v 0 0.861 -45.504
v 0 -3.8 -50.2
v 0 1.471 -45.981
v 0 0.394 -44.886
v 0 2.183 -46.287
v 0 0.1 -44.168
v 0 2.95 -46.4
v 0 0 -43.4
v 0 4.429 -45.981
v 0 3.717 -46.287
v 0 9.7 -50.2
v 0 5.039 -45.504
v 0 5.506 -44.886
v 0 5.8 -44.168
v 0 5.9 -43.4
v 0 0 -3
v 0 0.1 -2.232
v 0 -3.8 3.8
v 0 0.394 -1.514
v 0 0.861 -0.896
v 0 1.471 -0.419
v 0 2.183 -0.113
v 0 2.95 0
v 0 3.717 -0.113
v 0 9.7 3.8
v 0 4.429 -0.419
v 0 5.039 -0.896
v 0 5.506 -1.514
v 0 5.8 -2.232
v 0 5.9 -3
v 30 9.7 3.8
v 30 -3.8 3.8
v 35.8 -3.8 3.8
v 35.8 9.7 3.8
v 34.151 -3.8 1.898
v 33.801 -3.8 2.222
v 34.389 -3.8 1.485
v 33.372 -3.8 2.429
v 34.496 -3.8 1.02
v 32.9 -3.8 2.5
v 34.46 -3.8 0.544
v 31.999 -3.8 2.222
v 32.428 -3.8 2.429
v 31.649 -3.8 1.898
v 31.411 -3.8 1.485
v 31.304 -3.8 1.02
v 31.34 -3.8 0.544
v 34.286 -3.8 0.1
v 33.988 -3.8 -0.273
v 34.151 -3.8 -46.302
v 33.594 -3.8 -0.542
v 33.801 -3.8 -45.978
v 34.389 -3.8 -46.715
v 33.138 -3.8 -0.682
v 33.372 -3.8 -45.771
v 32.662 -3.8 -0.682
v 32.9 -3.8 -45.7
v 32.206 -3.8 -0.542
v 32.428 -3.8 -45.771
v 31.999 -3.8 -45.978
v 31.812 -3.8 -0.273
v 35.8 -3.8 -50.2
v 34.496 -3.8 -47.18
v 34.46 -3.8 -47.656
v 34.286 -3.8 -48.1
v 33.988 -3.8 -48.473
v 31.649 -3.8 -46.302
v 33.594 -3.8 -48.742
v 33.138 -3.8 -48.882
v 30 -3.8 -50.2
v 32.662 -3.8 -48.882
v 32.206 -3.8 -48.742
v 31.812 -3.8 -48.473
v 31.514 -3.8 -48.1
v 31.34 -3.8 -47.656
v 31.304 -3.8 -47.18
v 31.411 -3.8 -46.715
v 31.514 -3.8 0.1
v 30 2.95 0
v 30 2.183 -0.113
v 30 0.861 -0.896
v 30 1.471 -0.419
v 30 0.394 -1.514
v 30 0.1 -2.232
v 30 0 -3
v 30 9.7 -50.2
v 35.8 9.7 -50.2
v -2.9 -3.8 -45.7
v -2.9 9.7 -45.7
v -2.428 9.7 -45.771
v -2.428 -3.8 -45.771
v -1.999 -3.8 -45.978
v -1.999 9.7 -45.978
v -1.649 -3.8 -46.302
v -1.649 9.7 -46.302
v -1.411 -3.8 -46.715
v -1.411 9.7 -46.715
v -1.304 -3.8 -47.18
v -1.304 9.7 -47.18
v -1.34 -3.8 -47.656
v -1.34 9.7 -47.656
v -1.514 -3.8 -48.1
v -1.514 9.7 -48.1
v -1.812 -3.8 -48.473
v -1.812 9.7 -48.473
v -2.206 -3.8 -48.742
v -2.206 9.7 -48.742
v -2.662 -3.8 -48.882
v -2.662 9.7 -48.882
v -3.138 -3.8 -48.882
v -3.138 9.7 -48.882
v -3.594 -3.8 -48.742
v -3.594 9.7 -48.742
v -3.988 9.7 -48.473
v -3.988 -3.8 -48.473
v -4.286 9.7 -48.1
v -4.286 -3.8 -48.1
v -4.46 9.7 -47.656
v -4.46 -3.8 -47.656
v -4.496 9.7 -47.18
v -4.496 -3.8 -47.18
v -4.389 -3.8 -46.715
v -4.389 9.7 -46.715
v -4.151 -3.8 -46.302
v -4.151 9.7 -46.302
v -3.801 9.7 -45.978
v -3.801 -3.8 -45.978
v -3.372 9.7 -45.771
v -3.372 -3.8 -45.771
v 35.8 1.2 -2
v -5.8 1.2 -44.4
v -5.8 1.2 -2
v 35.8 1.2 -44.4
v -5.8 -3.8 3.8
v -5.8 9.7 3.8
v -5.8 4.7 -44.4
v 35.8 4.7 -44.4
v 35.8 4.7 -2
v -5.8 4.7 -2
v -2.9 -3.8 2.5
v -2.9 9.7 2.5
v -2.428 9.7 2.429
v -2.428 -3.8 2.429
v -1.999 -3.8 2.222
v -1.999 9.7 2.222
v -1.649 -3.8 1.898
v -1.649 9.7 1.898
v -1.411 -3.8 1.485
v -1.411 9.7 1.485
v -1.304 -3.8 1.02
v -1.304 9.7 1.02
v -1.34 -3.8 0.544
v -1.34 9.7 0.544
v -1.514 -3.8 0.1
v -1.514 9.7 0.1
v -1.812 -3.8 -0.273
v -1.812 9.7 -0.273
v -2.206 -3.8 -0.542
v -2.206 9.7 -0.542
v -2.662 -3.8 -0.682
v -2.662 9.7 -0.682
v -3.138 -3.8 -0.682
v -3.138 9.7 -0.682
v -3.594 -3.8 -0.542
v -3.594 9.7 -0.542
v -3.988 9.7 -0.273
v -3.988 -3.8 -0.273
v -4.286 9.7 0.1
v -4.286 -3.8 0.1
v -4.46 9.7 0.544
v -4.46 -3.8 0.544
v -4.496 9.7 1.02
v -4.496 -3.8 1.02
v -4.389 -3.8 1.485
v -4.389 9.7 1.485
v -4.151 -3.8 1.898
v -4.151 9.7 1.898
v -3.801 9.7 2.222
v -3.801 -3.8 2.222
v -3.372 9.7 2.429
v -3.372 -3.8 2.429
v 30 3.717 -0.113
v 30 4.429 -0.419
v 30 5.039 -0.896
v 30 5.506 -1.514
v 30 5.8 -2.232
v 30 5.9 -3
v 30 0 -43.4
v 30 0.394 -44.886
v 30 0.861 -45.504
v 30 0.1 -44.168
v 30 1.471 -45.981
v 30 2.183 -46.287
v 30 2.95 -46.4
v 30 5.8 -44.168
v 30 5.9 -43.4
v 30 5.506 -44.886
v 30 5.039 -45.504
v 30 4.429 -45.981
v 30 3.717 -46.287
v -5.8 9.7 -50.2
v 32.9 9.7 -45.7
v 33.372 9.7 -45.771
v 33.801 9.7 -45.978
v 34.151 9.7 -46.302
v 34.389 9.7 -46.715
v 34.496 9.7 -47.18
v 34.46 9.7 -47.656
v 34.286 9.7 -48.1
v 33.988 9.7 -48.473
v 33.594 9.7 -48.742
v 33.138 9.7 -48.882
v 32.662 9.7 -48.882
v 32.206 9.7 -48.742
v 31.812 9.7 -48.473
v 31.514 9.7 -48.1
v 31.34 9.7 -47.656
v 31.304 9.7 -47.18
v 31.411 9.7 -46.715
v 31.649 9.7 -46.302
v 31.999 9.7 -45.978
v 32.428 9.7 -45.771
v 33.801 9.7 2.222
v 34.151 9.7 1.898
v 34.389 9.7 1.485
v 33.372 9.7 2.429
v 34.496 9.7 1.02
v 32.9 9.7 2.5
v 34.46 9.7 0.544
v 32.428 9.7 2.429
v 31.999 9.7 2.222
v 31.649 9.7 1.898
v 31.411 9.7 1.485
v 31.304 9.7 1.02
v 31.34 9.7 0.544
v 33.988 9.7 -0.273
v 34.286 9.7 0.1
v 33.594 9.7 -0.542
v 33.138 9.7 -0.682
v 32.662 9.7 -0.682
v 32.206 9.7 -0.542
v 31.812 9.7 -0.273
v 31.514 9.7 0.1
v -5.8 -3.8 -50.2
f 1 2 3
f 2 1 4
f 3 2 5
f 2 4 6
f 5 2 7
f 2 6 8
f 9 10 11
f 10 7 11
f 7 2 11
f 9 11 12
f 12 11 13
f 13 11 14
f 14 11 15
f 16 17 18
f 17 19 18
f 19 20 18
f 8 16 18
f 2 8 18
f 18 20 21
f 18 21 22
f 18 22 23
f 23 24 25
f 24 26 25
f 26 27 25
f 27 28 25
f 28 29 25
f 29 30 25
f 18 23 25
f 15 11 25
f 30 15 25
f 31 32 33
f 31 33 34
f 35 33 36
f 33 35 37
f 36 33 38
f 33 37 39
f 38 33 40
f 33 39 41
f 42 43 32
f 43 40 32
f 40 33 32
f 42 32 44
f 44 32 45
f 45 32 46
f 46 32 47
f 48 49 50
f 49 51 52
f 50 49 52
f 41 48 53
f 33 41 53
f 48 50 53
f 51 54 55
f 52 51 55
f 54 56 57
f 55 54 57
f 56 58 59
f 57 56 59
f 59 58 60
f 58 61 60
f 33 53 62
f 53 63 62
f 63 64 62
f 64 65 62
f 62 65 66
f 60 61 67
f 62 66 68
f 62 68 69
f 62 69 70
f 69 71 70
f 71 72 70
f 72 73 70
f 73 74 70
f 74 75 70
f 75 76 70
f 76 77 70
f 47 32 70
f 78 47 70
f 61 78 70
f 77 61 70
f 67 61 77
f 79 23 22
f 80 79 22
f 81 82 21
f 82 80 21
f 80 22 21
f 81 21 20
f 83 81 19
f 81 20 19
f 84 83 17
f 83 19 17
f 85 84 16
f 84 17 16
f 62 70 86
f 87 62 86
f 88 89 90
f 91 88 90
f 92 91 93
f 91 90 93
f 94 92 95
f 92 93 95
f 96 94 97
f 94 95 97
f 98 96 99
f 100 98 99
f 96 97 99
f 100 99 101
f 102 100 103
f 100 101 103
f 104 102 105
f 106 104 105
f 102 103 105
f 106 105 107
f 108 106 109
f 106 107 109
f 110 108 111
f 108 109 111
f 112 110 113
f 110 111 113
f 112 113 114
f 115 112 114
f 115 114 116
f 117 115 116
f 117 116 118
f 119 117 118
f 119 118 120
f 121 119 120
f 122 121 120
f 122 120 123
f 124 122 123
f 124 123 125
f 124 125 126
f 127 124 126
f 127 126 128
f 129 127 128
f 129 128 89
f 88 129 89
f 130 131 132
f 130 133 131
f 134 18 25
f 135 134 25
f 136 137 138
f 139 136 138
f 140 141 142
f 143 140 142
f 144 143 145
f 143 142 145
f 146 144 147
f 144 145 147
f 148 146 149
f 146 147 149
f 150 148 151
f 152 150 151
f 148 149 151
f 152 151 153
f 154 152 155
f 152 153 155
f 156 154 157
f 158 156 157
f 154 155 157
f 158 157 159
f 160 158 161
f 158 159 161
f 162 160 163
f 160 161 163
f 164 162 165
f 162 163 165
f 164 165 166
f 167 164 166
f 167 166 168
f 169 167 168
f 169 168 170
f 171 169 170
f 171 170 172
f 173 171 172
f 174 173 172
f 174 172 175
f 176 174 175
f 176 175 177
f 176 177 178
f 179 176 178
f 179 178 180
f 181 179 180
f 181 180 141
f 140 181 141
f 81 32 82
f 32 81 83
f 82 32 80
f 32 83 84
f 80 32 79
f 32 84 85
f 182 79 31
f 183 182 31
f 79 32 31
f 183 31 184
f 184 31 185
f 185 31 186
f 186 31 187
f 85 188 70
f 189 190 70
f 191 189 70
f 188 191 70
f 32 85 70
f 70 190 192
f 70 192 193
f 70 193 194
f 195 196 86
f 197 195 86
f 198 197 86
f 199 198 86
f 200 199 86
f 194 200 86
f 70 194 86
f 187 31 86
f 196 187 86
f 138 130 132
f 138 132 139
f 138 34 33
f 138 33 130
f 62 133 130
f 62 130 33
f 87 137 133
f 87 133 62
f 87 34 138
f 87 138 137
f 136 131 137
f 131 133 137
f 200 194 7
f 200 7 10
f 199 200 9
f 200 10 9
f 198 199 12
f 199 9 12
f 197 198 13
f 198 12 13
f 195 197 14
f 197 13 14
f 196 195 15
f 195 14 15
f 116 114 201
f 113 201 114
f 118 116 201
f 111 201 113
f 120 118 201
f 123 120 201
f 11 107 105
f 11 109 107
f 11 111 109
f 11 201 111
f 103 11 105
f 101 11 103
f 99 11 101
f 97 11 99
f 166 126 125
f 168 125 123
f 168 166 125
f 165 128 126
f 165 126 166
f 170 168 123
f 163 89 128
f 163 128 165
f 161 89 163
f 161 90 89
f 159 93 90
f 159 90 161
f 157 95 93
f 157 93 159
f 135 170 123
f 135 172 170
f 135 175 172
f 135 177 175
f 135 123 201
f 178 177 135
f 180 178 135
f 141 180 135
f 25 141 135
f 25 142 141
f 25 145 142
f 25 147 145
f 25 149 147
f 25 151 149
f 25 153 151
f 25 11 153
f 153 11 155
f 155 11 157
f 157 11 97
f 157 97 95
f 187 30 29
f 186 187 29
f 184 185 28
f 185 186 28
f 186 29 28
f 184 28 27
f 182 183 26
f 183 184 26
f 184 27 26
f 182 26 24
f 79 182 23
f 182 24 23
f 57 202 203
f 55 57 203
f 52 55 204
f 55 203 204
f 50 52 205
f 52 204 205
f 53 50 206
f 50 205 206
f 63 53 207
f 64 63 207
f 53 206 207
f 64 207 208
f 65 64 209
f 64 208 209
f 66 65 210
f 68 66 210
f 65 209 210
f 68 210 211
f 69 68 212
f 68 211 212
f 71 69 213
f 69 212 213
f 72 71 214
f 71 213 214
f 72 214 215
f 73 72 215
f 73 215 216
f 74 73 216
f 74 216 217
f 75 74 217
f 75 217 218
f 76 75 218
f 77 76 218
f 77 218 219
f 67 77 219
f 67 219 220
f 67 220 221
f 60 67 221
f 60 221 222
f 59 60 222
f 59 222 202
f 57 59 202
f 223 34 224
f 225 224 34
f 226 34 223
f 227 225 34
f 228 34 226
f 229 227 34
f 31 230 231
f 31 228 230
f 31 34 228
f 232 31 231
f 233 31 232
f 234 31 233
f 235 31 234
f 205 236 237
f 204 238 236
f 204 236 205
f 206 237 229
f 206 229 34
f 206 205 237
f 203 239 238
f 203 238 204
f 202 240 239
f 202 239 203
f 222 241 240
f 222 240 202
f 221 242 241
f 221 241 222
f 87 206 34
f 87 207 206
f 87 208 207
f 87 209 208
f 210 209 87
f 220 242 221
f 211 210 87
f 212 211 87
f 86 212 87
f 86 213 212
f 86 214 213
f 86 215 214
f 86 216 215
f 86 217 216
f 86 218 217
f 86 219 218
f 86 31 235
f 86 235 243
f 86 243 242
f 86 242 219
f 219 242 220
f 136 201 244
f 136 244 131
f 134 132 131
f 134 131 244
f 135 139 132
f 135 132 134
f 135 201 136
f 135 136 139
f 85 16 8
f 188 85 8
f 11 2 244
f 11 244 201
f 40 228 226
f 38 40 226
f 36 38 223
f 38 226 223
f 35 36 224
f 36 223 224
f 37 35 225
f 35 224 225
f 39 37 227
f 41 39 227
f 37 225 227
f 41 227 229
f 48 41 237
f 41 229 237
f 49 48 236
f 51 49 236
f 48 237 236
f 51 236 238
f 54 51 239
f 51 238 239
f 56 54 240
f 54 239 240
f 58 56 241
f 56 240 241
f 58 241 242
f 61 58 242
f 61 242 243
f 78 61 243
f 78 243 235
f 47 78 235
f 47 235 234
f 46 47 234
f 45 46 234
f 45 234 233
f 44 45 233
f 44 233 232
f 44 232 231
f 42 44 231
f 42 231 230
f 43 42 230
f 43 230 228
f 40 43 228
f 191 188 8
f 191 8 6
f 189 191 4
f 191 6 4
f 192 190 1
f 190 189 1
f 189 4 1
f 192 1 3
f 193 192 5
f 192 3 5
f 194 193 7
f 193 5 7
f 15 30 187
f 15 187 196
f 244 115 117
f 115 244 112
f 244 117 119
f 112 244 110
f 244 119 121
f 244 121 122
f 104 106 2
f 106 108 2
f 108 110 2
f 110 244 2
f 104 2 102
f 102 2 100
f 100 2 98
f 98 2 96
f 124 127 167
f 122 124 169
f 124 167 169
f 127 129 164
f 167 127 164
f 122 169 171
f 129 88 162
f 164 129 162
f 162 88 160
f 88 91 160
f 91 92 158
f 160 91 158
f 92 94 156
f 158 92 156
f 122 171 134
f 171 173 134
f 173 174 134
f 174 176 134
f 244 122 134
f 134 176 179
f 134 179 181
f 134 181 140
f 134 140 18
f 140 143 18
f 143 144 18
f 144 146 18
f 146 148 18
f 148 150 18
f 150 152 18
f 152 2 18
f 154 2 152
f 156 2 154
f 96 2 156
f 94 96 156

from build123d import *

# Parameters (mm, degrees)
SKETCH1_W           = 46.4
SKETCH1_H           = 5.9
SKETCH1_W_2         = 42.4
SKETCH1_H_2         = 3.5
BOSS_EXTRUDE1_DEPTH = 30
FILLET2_R           = 3
SKETCH2_W           = 54
SKETCH2_H           = 13.5
SKETCH2_W_2         = 42.4
SKETCH2_H_2         = 3.5
BOSS_EXTRUDE2_DEPTH = 5.8
SKETCH3_W           = 54
SKETCH3_H           = 13.5
SKETCH3_W_2         = 42.4
SKETCH3_H_2         = 3.5
BOSS_EXTRUDE3_DEPTH = 5.8
SKETCH4_R           = 1.6
CUT_EXTRUDE1_DEPTH  = 64.118380841


with BuildPart() as part:
    # Sketch1 → Boss-Extrude1 (new body)
    with BuildSketch(Plane(origin=(0, 0, 0), x_dir=(0, 0, -1), z_dir=(1, 0, 0))):
        with Locations((23.2, 2.95)):
            Rectangle(SKETCH1_W, SKETCH1_H)
        with Locations((23.2, 2.95)):
            Rectangle(SKETCH1_W_2, SKETCH1_H_2, mode=Mode.SUBTRACT)
    extrude(amount=BOSS_EXTRUDE1_DEPTH)

    # Fillet2
    # the kernel refuses this fillet: 3 mm, written as the material it takes off along each edge
    with BuildSketch(Plane(origin=(-7.5, 0, -46.4), x_dir=(0, 0, 1), z_dir=(1, 0, 0)), Plane(origin=(-7.5, 5.9, 0), x_dir=(0, 0, -1), z_dir=(1, 0, 0)), Plane(origin=(-7.5, 5.9, -46.4), x_dir=(0, -1, 0), z_dir=(1, 0, 0))) as fillet2_piece_1:
        with BuildLine():
            CenterArc((FILLET2_R, -FILLET2_R), FILLET2_R, 90, 90)
            Line((0, -FILLET2_R), (0, 0))
            Line((0, 0), (FILLET2_R, 0))
        make_face()
    extrude(amount=45, mode=Mode.SUBTRACT)
    with BuildSketch(Plane(origin=(-7.5, 0, 0), x_dir=(0, 0, -1), z_dir=(1, 0, 0))) as fillet2_piece_2:
        with BuildLine():
            CenterArc((FILLET2_R, FILLET2_R), FILLET2_R, 180, 90)
            Line((0, FILLET2_R), (0, 0))
            Line((0, 0), (FILLET2_R, 0))
        make_face()
    extrude(amount=45, mode=Mode.SUBTRACT)

    # Sketch2 → Boss-Extrude2 (add)
    with BuildSketch(Plane(origin=(30, 0, 0), x_dir=(0, 0, -1), z_dir=(1, 0, 0))):
        with Locations((23.2, 2.95)):
            Rectangle(SKETCH2_W, SKETCH2_H)
        with Locations((23.2, 2.95)):
            Rectangle(SKETCH2_W_2, SKETCH2_H_2, mode=Mode.SUBTRACT)
    extrude(amount=BOSS_EXTRUDE2_DEPTH)

    # Sketch3 → Boss-Extrude3 (add)
    with BuildSketch(Plane.ZY):
        with Locations((-23.2, 2.95)):
            Rectangle(SKETCH3_W, SKETCH3_H)
        with Locations((-23.2, 2.95)):
            Rectangle(SKETCH3_W_2, SKETCH3_H_2, mode=Mode.SUBTRACT)
    extrude(amount=BOSS_EXTRUDE3_DEPTH)

    # Sketch4 → Cut-Extrude1 (cut, through all)
    with BuildSketch(Plane(origin=(0, 9.7, 0), x_dir=(1, 0, 0), z_dir=(0, 1, 0))):
        with Locations(Location((-2.9, 47.3, 0), (0, 0, 270))):
            Circle(SKETCH4_R)
        with Locations(Location((32.9, 47.3, 0), (0, 0, 270))):
            Circle(SKETCH4_R)
        with Locations(Location((-2.9, -0.9, 0), (0, 0, 270))):
            Circle(SKETCH4_R)
        with Locations(Location((32.9, -0.9, 0), (0, 0, 270))):
            Circle(SKETCH4_R)
    extrude(amount=-CUT_EXTRUDE1_DEPTH, mode=Mode.SUBTRACT)


solid = part.part
